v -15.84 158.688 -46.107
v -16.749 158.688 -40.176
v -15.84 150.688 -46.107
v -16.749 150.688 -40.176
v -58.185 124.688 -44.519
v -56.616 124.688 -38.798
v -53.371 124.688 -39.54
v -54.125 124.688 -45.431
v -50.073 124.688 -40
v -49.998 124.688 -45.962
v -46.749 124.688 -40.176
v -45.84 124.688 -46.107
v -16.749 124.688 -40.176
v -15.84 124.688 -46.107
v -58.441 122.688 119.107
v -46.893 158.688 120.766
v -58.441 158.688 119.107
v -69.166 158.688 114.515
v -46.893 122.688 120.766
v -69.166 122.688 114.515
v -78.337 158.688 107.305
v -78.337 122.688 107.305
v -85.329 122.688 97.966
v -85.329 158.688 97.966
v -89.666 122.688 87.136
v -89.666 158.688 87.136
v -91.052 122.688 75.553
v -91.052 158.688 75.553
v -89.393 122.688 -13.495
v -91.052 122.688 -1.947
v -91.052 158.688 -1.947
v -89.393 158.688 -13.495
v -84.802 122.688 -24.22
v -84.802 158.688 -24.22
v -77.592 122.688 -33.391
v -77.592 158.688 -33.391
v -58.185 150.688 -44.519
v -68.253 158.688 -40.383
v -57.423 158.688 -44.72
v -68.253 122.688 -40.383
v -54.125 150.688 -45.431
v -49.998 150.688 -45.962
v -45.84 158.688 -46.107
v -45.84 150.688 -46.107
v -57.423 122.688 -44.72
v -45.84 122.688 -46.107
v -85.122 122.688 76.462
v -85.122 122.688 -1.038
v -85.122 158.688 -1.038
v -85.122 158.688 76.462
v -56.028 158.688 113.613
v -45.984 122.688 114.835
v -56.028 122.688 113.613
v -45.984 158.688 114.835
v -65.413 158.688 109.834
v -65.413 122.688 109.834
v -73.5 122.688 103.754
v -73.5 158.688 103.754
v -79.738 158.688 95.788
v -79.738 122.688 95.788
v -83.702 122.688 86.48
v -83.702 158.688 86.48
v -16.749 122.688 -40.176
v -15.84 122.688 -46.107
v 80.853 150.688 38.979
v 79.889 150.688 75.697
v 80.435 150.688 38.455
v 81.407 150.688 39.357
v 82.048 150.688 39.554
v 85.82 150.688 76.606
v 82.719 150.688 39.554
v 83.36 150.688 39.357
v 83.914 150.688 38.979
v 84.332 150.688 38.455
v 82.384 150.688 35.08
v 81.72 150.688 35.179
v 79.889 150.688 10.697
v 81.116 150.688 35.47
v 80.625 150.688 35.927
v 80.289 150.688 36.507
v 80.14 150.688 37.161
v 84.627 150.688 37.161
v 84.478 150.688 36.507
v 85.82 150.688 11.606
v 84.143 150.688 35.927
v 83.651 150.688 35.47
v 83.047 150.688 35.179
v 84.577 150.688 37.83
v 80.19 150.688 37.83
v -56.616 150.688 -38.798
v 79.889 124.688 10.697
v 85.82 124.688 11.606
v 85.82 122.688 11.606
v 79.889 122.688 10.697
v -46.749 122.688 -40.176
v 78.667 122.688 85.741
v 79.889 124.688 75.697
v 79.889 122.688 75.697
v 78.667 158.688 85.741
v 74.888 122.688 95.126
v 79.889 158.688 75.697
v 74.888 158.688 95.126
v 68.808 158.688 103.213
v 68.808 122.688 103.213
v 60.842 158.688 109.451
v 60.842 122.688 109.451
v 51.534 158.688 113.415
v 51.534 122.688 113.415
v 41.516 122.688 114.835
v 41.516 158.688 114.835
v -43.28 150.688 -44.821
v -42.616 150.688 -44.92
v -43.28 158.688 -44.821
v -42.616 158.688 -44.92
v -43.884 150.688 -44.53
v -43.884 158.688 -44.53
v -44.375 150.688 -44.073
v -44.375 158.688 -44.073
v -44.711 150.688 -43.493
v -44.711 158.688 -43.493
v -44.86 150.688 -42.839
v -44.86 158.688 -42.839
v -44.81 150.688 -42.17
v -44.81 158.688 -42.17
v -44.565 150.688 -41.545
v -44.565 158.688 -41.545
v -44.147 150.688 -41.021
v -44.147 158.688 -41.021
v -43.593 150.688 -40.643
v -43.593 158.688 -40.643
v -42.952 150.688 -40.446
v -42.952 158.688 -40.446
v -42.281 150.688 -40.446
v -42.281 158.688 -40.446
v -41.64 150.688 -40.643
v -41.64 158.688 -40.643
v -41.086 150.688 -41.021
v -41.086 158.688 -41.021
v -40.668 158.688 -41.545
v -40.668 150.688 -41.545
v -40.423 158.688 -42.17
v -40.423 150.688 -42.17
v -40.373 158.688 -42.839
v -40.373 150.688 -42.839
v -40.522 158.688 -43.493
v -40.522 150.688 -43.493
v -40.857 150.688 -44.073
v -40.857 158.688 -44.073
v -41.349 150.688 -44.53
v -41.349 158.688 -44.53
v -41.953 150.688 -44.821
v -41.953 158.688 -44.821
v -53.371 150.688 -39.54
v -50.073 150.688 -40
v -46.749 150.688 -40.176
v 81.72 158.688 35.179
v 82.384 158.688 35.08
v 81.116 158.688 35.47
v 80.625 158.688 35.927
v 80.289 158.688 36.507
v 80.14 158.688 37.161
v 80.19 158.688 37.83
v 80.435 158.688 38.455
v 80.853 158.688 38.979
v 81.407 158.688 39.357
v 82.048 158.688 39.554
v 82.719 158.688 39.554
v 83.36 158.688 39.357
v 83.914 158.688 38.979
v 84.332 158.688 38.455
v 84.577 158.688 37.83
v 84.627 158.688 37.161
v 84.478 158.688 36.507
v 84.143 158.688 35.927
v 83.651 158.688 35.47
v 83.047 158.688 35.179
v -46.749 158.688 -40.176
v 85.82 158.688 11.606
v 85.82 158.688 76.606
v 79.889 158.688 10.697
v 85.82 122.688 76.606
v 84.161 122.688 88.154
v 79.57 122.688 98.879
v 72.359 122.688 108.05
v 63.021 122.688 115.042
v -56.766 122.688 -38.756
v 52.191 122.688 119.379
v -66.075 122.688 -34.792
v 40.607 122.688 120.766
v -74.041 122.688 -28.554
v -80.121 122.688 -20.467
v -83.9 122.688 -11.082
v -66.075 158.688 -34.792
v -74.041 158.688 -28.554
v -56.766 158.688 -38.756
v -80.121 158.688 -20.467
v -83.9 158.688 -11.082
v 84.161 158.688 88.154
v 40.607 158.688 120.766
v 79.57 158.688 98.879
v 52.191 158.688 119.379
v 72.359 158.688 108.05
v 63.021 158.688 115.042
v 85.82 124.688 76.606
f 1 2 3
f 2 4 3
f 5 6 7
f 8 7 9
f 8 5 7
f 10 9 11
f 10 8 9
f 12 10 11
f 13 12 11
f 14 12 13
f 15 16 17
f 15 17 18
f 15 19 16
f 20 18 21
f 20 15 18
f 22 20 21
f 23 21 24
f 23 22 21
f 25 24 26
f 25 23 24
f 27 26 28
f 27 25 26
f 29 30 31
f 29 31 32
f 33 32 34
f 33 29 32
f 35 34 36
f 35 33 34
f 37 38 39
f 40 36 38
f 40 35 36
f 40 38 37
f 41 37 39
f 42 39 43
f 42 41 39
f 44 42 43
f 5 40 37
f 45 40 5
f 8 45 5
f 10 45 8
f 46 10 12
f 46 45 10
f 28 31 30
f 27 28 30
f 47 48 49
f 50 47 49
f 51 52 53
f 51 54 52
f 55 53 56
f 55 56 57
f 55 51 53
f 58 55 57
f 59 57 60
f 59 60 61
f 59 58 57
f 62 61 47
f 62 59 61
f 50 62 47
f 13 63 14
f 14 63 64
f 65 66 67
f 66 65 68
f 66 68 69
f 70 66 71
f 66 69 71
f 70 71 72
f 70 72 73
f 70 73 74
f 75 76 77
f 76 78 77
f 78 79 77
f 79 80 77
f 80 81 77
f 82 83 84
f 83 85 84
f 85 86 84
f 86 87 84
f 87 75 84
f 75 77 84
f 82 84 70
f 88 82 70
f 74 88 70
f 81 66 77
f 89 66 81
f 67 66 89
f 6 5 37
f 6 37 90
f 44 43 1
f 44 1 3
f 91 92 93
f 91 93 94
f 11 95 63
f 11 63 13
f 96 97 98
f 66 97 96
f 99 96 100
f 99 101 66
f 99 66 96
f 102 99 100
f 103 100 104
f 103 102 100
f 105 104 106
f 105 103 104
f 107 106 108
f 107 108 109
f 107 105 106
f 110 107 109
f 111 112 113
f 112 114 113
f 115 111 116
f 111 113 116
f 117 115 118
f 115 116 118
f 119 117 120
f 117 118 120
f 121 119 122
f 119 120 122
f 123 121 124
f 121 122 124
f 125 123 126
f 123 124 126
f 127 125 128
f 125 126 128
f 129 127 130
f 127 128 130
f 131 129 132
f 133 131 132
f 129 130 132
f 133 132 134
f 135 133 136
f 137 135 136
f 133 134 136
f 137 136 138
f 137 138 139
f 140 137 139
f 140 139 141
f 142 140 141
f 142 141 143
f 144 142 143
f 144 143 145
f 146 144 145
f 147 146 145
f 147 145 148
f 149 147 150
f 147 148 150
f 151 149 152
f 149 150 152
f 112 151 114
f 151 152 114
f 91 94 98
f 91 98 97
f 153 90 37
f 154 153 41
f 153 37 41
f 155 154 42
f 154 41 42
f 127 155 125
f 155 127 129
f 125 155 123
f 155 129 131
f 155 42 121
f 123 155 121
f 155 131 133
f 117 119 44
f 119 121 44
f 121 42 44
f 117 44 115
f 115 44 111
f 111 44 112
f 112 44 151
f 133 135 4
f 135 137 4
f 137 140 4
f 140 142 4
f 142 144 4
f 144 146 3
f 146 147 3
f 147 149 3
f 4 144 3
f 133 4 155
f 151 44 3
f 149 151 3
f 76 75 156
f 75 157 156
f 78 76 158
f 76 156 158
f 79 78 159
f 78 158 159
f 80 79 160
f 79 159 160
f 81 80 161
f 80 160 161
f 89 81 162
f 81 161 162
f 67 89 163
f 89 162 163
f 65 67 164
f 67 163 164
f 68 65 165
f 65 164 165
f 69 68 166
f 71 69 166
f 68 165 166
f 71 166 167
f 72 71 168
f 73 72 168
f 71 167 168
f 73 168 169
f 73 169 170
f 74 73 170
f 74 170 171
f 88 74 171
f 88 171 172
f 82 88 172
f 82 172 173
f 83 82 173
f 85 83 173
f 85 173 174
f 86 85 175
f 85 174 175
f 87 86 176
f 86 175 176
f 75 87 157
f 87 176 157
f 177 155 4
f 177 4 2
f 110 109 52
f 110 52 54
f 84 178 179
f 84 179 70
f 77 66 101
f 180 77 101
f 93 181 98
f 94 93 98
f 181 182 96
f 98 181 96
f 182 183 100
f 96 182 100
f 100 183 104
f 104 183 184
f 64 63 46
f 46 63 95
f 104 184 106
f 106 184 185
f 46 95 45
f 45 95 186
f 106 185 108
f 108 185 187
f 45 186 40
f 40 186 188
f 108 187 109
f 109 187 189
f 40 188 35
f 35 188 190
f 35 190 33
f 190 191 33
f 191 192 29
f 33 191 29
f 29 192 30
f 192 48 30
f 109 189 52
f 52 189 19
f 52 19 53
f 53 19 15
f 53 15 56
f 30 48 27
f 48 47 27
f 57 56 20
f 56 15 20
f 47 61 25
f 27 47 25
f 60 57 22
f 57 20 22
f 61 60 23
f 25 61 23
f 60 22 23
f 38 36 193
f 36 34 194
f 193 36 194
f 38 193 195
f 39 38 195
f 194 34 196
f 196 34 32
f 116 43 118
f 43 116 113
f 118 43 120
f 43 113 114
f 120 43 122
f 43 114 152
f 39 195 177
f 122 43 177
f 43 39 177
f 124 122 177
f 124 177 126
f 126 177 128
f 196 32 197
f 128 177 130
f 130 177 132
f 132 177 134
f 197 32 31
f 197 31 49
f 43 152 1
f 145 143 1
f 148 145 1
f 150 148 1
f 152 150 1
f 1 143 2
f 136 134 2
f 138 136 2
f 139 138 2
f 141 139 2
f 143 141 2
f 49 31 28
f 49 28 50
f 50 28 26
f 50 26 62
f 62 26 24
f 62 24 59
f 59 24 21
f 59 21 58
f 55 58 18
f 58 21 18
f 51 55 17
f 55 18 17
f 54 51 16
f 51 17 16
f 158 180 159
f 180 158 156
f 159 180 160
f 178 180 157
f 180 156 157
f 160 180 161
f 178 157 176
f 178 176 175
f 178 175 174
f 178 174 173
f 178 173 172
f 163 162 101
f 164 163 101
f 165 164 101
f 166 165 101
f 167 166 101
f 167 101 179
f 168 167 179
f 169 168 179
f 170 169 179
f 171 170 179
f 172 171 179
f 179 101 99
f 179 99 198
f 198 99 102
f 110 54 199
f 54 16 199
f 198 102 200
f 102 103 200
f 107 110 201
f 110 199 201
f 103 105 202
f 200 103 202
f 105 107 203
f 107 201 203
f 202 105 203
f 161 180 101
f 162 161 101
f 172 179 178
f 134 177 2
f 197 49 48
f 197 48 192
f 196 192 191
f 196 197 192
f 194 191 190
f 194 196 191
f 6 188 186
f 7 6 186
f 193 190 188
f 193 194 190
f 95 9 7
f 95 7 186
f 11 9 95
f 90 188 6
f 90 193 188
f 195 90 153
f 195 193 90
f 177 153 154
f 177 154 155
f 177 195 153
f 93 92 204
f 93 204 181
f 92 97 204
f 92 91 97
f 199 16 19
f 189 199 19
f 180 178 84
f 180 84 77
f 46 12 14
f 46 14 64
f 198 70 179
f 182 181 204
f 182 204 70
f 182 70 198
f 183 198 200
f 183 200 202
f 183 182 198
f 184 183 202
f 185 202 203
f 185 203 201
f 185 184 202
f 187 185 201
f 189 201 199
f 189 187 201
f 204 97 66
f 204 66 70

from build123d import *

# Parameters (mm, degrees)
SKETCH6_W                     = 2.25
SKETCH6_H                     = 12
M4_CLEARANCE_HOLE1_AT_2_COUNT = 2
M4_CLEARANCE_HOLE1_AT_2_PITCH = 148.408220797
CUT_EXTRUDE1_START            = -24
CUT_EXTRUDE1_DEPTH            = 26


with BuildPart() as part:
    # Sweep1: sweep along a path in Sketch1
    with BuildLine(Plane(origin=(0, 152.68757152, 0), x_dir=(1, 0, 0), z_dir=(0, 1, 0))) as sweep1_path:
        Line((82.38365074, -11.079514347), (82.38365074, -76.079514347))
        ThreePointArc((82.38365074, -76.079514347), (70.301805464, -105.247669071), (41.13365074, -117.329514347))
        Line((41.13365074, -117.329514347), (-46.36634926, -117.329514347))
        ThreePointArc((-46.36634926, -117.329514347), (-75.534503984, -105.247669071), (-87.61634926, -76.079514347))
        Line((-87.61634926, -76.079514347), (-87.61634926, 1.420485653))
        ThreePointArc((-87.61634926, 1.420485653), (-75.534503984, 30.588640377), (-46.36634926, 42.670485653))
        Line((-46.36634926, 42.670485653), (-16.36634926, 42.670485653))
    # Sketch2 → Sweep1 (sweep)
    with BuildSketch(Plane.ZY.offset(52.61634926)):
        Polygon((-45.670485653, 153.211679549), (-45.670485653, 158.68757152), (-39.670485653, 158.68757152), (-39.670485653, 148.68757152), (-39.670485653, 142.68757152), (-39.670485653, 122.68757152), (-45.670485653, 122.68757152), (-45.670485653, 142.68757152), align=None)
    sweep(path=sweep1_path.line)

    # Sketch6 → M4 Clearance Hole1 (revolve, cut)
    with BuildSketch(Plane(origin=(-42.61634926, 146.68757152, -42.670485653), x_dir=(0, 0, -1), z_dir=(1, 0, 0))):
        with Locations((1.125, 6)):
            Rectangle(SKETCH6_W, SKETCH6_H)
    m4_clearance_hole1 = revolve(axis=Axis((-42.61634926, 140.33757152, -42.670485653), (0, 1, 0)), mode=Mode.SUBTRACT)

    # M4 Clearance Hole1 at 2: M4 Clearance Hole1 ×2
    with Locations(*[Vector(0.8422714006615114, 0, 0.5390536964233672) * (i * M4_CLEARANCE_HOLE1_AT_2_PITCH) for i in range(1, M4_CLEARANCE_HOLE1_AT_2_COUNT)]):
        add(m4_clearance_hole1, mode=Mode.SUBTRACT)

    # Sketch7 → Cut-Extrude1 (cut)
    with BuildSketch(Plane(origin=(0, 148.68757152, 0), x_dir=(1, 0, 0), z_dir=(0, 1, 0)).offset(CUT_EXTRUDE1_START)):
        Polygon((79.889021707, -75.697125548), (85.819751318, -76.606216457), (85.819751318, -11.606216457), (79.889021707, -10.697125548), align=None)
        with BuildLine():
            Line((-46.748738059, 40.17585662), (-16.748738059, 40.17585662))
            Line((-16.748738059, 40.17585662), (-15.83964715, 46.106586231))
            Line((-15.83964715, 46.106586231), (-45.83964715, 46.106586231))
            ThreePointArc((-45.83964715, 46.106586231), (-52.06795996, 45.744481811), (-58.185151135, 44.518524149))
            Line((-58.185151135, 44.518524149), (-56.61634926, 38.797784913))
            ThreePointArc((-56.61634926, 38.797784913), (-51.727010908, 39.805226198), (-46.748738059, 40.17585662))
        make_face()
    extrude(amount=CUT_EXTRUDE1_DEPTH, mode=Mode.SUBTRACT)


solid = part.part
